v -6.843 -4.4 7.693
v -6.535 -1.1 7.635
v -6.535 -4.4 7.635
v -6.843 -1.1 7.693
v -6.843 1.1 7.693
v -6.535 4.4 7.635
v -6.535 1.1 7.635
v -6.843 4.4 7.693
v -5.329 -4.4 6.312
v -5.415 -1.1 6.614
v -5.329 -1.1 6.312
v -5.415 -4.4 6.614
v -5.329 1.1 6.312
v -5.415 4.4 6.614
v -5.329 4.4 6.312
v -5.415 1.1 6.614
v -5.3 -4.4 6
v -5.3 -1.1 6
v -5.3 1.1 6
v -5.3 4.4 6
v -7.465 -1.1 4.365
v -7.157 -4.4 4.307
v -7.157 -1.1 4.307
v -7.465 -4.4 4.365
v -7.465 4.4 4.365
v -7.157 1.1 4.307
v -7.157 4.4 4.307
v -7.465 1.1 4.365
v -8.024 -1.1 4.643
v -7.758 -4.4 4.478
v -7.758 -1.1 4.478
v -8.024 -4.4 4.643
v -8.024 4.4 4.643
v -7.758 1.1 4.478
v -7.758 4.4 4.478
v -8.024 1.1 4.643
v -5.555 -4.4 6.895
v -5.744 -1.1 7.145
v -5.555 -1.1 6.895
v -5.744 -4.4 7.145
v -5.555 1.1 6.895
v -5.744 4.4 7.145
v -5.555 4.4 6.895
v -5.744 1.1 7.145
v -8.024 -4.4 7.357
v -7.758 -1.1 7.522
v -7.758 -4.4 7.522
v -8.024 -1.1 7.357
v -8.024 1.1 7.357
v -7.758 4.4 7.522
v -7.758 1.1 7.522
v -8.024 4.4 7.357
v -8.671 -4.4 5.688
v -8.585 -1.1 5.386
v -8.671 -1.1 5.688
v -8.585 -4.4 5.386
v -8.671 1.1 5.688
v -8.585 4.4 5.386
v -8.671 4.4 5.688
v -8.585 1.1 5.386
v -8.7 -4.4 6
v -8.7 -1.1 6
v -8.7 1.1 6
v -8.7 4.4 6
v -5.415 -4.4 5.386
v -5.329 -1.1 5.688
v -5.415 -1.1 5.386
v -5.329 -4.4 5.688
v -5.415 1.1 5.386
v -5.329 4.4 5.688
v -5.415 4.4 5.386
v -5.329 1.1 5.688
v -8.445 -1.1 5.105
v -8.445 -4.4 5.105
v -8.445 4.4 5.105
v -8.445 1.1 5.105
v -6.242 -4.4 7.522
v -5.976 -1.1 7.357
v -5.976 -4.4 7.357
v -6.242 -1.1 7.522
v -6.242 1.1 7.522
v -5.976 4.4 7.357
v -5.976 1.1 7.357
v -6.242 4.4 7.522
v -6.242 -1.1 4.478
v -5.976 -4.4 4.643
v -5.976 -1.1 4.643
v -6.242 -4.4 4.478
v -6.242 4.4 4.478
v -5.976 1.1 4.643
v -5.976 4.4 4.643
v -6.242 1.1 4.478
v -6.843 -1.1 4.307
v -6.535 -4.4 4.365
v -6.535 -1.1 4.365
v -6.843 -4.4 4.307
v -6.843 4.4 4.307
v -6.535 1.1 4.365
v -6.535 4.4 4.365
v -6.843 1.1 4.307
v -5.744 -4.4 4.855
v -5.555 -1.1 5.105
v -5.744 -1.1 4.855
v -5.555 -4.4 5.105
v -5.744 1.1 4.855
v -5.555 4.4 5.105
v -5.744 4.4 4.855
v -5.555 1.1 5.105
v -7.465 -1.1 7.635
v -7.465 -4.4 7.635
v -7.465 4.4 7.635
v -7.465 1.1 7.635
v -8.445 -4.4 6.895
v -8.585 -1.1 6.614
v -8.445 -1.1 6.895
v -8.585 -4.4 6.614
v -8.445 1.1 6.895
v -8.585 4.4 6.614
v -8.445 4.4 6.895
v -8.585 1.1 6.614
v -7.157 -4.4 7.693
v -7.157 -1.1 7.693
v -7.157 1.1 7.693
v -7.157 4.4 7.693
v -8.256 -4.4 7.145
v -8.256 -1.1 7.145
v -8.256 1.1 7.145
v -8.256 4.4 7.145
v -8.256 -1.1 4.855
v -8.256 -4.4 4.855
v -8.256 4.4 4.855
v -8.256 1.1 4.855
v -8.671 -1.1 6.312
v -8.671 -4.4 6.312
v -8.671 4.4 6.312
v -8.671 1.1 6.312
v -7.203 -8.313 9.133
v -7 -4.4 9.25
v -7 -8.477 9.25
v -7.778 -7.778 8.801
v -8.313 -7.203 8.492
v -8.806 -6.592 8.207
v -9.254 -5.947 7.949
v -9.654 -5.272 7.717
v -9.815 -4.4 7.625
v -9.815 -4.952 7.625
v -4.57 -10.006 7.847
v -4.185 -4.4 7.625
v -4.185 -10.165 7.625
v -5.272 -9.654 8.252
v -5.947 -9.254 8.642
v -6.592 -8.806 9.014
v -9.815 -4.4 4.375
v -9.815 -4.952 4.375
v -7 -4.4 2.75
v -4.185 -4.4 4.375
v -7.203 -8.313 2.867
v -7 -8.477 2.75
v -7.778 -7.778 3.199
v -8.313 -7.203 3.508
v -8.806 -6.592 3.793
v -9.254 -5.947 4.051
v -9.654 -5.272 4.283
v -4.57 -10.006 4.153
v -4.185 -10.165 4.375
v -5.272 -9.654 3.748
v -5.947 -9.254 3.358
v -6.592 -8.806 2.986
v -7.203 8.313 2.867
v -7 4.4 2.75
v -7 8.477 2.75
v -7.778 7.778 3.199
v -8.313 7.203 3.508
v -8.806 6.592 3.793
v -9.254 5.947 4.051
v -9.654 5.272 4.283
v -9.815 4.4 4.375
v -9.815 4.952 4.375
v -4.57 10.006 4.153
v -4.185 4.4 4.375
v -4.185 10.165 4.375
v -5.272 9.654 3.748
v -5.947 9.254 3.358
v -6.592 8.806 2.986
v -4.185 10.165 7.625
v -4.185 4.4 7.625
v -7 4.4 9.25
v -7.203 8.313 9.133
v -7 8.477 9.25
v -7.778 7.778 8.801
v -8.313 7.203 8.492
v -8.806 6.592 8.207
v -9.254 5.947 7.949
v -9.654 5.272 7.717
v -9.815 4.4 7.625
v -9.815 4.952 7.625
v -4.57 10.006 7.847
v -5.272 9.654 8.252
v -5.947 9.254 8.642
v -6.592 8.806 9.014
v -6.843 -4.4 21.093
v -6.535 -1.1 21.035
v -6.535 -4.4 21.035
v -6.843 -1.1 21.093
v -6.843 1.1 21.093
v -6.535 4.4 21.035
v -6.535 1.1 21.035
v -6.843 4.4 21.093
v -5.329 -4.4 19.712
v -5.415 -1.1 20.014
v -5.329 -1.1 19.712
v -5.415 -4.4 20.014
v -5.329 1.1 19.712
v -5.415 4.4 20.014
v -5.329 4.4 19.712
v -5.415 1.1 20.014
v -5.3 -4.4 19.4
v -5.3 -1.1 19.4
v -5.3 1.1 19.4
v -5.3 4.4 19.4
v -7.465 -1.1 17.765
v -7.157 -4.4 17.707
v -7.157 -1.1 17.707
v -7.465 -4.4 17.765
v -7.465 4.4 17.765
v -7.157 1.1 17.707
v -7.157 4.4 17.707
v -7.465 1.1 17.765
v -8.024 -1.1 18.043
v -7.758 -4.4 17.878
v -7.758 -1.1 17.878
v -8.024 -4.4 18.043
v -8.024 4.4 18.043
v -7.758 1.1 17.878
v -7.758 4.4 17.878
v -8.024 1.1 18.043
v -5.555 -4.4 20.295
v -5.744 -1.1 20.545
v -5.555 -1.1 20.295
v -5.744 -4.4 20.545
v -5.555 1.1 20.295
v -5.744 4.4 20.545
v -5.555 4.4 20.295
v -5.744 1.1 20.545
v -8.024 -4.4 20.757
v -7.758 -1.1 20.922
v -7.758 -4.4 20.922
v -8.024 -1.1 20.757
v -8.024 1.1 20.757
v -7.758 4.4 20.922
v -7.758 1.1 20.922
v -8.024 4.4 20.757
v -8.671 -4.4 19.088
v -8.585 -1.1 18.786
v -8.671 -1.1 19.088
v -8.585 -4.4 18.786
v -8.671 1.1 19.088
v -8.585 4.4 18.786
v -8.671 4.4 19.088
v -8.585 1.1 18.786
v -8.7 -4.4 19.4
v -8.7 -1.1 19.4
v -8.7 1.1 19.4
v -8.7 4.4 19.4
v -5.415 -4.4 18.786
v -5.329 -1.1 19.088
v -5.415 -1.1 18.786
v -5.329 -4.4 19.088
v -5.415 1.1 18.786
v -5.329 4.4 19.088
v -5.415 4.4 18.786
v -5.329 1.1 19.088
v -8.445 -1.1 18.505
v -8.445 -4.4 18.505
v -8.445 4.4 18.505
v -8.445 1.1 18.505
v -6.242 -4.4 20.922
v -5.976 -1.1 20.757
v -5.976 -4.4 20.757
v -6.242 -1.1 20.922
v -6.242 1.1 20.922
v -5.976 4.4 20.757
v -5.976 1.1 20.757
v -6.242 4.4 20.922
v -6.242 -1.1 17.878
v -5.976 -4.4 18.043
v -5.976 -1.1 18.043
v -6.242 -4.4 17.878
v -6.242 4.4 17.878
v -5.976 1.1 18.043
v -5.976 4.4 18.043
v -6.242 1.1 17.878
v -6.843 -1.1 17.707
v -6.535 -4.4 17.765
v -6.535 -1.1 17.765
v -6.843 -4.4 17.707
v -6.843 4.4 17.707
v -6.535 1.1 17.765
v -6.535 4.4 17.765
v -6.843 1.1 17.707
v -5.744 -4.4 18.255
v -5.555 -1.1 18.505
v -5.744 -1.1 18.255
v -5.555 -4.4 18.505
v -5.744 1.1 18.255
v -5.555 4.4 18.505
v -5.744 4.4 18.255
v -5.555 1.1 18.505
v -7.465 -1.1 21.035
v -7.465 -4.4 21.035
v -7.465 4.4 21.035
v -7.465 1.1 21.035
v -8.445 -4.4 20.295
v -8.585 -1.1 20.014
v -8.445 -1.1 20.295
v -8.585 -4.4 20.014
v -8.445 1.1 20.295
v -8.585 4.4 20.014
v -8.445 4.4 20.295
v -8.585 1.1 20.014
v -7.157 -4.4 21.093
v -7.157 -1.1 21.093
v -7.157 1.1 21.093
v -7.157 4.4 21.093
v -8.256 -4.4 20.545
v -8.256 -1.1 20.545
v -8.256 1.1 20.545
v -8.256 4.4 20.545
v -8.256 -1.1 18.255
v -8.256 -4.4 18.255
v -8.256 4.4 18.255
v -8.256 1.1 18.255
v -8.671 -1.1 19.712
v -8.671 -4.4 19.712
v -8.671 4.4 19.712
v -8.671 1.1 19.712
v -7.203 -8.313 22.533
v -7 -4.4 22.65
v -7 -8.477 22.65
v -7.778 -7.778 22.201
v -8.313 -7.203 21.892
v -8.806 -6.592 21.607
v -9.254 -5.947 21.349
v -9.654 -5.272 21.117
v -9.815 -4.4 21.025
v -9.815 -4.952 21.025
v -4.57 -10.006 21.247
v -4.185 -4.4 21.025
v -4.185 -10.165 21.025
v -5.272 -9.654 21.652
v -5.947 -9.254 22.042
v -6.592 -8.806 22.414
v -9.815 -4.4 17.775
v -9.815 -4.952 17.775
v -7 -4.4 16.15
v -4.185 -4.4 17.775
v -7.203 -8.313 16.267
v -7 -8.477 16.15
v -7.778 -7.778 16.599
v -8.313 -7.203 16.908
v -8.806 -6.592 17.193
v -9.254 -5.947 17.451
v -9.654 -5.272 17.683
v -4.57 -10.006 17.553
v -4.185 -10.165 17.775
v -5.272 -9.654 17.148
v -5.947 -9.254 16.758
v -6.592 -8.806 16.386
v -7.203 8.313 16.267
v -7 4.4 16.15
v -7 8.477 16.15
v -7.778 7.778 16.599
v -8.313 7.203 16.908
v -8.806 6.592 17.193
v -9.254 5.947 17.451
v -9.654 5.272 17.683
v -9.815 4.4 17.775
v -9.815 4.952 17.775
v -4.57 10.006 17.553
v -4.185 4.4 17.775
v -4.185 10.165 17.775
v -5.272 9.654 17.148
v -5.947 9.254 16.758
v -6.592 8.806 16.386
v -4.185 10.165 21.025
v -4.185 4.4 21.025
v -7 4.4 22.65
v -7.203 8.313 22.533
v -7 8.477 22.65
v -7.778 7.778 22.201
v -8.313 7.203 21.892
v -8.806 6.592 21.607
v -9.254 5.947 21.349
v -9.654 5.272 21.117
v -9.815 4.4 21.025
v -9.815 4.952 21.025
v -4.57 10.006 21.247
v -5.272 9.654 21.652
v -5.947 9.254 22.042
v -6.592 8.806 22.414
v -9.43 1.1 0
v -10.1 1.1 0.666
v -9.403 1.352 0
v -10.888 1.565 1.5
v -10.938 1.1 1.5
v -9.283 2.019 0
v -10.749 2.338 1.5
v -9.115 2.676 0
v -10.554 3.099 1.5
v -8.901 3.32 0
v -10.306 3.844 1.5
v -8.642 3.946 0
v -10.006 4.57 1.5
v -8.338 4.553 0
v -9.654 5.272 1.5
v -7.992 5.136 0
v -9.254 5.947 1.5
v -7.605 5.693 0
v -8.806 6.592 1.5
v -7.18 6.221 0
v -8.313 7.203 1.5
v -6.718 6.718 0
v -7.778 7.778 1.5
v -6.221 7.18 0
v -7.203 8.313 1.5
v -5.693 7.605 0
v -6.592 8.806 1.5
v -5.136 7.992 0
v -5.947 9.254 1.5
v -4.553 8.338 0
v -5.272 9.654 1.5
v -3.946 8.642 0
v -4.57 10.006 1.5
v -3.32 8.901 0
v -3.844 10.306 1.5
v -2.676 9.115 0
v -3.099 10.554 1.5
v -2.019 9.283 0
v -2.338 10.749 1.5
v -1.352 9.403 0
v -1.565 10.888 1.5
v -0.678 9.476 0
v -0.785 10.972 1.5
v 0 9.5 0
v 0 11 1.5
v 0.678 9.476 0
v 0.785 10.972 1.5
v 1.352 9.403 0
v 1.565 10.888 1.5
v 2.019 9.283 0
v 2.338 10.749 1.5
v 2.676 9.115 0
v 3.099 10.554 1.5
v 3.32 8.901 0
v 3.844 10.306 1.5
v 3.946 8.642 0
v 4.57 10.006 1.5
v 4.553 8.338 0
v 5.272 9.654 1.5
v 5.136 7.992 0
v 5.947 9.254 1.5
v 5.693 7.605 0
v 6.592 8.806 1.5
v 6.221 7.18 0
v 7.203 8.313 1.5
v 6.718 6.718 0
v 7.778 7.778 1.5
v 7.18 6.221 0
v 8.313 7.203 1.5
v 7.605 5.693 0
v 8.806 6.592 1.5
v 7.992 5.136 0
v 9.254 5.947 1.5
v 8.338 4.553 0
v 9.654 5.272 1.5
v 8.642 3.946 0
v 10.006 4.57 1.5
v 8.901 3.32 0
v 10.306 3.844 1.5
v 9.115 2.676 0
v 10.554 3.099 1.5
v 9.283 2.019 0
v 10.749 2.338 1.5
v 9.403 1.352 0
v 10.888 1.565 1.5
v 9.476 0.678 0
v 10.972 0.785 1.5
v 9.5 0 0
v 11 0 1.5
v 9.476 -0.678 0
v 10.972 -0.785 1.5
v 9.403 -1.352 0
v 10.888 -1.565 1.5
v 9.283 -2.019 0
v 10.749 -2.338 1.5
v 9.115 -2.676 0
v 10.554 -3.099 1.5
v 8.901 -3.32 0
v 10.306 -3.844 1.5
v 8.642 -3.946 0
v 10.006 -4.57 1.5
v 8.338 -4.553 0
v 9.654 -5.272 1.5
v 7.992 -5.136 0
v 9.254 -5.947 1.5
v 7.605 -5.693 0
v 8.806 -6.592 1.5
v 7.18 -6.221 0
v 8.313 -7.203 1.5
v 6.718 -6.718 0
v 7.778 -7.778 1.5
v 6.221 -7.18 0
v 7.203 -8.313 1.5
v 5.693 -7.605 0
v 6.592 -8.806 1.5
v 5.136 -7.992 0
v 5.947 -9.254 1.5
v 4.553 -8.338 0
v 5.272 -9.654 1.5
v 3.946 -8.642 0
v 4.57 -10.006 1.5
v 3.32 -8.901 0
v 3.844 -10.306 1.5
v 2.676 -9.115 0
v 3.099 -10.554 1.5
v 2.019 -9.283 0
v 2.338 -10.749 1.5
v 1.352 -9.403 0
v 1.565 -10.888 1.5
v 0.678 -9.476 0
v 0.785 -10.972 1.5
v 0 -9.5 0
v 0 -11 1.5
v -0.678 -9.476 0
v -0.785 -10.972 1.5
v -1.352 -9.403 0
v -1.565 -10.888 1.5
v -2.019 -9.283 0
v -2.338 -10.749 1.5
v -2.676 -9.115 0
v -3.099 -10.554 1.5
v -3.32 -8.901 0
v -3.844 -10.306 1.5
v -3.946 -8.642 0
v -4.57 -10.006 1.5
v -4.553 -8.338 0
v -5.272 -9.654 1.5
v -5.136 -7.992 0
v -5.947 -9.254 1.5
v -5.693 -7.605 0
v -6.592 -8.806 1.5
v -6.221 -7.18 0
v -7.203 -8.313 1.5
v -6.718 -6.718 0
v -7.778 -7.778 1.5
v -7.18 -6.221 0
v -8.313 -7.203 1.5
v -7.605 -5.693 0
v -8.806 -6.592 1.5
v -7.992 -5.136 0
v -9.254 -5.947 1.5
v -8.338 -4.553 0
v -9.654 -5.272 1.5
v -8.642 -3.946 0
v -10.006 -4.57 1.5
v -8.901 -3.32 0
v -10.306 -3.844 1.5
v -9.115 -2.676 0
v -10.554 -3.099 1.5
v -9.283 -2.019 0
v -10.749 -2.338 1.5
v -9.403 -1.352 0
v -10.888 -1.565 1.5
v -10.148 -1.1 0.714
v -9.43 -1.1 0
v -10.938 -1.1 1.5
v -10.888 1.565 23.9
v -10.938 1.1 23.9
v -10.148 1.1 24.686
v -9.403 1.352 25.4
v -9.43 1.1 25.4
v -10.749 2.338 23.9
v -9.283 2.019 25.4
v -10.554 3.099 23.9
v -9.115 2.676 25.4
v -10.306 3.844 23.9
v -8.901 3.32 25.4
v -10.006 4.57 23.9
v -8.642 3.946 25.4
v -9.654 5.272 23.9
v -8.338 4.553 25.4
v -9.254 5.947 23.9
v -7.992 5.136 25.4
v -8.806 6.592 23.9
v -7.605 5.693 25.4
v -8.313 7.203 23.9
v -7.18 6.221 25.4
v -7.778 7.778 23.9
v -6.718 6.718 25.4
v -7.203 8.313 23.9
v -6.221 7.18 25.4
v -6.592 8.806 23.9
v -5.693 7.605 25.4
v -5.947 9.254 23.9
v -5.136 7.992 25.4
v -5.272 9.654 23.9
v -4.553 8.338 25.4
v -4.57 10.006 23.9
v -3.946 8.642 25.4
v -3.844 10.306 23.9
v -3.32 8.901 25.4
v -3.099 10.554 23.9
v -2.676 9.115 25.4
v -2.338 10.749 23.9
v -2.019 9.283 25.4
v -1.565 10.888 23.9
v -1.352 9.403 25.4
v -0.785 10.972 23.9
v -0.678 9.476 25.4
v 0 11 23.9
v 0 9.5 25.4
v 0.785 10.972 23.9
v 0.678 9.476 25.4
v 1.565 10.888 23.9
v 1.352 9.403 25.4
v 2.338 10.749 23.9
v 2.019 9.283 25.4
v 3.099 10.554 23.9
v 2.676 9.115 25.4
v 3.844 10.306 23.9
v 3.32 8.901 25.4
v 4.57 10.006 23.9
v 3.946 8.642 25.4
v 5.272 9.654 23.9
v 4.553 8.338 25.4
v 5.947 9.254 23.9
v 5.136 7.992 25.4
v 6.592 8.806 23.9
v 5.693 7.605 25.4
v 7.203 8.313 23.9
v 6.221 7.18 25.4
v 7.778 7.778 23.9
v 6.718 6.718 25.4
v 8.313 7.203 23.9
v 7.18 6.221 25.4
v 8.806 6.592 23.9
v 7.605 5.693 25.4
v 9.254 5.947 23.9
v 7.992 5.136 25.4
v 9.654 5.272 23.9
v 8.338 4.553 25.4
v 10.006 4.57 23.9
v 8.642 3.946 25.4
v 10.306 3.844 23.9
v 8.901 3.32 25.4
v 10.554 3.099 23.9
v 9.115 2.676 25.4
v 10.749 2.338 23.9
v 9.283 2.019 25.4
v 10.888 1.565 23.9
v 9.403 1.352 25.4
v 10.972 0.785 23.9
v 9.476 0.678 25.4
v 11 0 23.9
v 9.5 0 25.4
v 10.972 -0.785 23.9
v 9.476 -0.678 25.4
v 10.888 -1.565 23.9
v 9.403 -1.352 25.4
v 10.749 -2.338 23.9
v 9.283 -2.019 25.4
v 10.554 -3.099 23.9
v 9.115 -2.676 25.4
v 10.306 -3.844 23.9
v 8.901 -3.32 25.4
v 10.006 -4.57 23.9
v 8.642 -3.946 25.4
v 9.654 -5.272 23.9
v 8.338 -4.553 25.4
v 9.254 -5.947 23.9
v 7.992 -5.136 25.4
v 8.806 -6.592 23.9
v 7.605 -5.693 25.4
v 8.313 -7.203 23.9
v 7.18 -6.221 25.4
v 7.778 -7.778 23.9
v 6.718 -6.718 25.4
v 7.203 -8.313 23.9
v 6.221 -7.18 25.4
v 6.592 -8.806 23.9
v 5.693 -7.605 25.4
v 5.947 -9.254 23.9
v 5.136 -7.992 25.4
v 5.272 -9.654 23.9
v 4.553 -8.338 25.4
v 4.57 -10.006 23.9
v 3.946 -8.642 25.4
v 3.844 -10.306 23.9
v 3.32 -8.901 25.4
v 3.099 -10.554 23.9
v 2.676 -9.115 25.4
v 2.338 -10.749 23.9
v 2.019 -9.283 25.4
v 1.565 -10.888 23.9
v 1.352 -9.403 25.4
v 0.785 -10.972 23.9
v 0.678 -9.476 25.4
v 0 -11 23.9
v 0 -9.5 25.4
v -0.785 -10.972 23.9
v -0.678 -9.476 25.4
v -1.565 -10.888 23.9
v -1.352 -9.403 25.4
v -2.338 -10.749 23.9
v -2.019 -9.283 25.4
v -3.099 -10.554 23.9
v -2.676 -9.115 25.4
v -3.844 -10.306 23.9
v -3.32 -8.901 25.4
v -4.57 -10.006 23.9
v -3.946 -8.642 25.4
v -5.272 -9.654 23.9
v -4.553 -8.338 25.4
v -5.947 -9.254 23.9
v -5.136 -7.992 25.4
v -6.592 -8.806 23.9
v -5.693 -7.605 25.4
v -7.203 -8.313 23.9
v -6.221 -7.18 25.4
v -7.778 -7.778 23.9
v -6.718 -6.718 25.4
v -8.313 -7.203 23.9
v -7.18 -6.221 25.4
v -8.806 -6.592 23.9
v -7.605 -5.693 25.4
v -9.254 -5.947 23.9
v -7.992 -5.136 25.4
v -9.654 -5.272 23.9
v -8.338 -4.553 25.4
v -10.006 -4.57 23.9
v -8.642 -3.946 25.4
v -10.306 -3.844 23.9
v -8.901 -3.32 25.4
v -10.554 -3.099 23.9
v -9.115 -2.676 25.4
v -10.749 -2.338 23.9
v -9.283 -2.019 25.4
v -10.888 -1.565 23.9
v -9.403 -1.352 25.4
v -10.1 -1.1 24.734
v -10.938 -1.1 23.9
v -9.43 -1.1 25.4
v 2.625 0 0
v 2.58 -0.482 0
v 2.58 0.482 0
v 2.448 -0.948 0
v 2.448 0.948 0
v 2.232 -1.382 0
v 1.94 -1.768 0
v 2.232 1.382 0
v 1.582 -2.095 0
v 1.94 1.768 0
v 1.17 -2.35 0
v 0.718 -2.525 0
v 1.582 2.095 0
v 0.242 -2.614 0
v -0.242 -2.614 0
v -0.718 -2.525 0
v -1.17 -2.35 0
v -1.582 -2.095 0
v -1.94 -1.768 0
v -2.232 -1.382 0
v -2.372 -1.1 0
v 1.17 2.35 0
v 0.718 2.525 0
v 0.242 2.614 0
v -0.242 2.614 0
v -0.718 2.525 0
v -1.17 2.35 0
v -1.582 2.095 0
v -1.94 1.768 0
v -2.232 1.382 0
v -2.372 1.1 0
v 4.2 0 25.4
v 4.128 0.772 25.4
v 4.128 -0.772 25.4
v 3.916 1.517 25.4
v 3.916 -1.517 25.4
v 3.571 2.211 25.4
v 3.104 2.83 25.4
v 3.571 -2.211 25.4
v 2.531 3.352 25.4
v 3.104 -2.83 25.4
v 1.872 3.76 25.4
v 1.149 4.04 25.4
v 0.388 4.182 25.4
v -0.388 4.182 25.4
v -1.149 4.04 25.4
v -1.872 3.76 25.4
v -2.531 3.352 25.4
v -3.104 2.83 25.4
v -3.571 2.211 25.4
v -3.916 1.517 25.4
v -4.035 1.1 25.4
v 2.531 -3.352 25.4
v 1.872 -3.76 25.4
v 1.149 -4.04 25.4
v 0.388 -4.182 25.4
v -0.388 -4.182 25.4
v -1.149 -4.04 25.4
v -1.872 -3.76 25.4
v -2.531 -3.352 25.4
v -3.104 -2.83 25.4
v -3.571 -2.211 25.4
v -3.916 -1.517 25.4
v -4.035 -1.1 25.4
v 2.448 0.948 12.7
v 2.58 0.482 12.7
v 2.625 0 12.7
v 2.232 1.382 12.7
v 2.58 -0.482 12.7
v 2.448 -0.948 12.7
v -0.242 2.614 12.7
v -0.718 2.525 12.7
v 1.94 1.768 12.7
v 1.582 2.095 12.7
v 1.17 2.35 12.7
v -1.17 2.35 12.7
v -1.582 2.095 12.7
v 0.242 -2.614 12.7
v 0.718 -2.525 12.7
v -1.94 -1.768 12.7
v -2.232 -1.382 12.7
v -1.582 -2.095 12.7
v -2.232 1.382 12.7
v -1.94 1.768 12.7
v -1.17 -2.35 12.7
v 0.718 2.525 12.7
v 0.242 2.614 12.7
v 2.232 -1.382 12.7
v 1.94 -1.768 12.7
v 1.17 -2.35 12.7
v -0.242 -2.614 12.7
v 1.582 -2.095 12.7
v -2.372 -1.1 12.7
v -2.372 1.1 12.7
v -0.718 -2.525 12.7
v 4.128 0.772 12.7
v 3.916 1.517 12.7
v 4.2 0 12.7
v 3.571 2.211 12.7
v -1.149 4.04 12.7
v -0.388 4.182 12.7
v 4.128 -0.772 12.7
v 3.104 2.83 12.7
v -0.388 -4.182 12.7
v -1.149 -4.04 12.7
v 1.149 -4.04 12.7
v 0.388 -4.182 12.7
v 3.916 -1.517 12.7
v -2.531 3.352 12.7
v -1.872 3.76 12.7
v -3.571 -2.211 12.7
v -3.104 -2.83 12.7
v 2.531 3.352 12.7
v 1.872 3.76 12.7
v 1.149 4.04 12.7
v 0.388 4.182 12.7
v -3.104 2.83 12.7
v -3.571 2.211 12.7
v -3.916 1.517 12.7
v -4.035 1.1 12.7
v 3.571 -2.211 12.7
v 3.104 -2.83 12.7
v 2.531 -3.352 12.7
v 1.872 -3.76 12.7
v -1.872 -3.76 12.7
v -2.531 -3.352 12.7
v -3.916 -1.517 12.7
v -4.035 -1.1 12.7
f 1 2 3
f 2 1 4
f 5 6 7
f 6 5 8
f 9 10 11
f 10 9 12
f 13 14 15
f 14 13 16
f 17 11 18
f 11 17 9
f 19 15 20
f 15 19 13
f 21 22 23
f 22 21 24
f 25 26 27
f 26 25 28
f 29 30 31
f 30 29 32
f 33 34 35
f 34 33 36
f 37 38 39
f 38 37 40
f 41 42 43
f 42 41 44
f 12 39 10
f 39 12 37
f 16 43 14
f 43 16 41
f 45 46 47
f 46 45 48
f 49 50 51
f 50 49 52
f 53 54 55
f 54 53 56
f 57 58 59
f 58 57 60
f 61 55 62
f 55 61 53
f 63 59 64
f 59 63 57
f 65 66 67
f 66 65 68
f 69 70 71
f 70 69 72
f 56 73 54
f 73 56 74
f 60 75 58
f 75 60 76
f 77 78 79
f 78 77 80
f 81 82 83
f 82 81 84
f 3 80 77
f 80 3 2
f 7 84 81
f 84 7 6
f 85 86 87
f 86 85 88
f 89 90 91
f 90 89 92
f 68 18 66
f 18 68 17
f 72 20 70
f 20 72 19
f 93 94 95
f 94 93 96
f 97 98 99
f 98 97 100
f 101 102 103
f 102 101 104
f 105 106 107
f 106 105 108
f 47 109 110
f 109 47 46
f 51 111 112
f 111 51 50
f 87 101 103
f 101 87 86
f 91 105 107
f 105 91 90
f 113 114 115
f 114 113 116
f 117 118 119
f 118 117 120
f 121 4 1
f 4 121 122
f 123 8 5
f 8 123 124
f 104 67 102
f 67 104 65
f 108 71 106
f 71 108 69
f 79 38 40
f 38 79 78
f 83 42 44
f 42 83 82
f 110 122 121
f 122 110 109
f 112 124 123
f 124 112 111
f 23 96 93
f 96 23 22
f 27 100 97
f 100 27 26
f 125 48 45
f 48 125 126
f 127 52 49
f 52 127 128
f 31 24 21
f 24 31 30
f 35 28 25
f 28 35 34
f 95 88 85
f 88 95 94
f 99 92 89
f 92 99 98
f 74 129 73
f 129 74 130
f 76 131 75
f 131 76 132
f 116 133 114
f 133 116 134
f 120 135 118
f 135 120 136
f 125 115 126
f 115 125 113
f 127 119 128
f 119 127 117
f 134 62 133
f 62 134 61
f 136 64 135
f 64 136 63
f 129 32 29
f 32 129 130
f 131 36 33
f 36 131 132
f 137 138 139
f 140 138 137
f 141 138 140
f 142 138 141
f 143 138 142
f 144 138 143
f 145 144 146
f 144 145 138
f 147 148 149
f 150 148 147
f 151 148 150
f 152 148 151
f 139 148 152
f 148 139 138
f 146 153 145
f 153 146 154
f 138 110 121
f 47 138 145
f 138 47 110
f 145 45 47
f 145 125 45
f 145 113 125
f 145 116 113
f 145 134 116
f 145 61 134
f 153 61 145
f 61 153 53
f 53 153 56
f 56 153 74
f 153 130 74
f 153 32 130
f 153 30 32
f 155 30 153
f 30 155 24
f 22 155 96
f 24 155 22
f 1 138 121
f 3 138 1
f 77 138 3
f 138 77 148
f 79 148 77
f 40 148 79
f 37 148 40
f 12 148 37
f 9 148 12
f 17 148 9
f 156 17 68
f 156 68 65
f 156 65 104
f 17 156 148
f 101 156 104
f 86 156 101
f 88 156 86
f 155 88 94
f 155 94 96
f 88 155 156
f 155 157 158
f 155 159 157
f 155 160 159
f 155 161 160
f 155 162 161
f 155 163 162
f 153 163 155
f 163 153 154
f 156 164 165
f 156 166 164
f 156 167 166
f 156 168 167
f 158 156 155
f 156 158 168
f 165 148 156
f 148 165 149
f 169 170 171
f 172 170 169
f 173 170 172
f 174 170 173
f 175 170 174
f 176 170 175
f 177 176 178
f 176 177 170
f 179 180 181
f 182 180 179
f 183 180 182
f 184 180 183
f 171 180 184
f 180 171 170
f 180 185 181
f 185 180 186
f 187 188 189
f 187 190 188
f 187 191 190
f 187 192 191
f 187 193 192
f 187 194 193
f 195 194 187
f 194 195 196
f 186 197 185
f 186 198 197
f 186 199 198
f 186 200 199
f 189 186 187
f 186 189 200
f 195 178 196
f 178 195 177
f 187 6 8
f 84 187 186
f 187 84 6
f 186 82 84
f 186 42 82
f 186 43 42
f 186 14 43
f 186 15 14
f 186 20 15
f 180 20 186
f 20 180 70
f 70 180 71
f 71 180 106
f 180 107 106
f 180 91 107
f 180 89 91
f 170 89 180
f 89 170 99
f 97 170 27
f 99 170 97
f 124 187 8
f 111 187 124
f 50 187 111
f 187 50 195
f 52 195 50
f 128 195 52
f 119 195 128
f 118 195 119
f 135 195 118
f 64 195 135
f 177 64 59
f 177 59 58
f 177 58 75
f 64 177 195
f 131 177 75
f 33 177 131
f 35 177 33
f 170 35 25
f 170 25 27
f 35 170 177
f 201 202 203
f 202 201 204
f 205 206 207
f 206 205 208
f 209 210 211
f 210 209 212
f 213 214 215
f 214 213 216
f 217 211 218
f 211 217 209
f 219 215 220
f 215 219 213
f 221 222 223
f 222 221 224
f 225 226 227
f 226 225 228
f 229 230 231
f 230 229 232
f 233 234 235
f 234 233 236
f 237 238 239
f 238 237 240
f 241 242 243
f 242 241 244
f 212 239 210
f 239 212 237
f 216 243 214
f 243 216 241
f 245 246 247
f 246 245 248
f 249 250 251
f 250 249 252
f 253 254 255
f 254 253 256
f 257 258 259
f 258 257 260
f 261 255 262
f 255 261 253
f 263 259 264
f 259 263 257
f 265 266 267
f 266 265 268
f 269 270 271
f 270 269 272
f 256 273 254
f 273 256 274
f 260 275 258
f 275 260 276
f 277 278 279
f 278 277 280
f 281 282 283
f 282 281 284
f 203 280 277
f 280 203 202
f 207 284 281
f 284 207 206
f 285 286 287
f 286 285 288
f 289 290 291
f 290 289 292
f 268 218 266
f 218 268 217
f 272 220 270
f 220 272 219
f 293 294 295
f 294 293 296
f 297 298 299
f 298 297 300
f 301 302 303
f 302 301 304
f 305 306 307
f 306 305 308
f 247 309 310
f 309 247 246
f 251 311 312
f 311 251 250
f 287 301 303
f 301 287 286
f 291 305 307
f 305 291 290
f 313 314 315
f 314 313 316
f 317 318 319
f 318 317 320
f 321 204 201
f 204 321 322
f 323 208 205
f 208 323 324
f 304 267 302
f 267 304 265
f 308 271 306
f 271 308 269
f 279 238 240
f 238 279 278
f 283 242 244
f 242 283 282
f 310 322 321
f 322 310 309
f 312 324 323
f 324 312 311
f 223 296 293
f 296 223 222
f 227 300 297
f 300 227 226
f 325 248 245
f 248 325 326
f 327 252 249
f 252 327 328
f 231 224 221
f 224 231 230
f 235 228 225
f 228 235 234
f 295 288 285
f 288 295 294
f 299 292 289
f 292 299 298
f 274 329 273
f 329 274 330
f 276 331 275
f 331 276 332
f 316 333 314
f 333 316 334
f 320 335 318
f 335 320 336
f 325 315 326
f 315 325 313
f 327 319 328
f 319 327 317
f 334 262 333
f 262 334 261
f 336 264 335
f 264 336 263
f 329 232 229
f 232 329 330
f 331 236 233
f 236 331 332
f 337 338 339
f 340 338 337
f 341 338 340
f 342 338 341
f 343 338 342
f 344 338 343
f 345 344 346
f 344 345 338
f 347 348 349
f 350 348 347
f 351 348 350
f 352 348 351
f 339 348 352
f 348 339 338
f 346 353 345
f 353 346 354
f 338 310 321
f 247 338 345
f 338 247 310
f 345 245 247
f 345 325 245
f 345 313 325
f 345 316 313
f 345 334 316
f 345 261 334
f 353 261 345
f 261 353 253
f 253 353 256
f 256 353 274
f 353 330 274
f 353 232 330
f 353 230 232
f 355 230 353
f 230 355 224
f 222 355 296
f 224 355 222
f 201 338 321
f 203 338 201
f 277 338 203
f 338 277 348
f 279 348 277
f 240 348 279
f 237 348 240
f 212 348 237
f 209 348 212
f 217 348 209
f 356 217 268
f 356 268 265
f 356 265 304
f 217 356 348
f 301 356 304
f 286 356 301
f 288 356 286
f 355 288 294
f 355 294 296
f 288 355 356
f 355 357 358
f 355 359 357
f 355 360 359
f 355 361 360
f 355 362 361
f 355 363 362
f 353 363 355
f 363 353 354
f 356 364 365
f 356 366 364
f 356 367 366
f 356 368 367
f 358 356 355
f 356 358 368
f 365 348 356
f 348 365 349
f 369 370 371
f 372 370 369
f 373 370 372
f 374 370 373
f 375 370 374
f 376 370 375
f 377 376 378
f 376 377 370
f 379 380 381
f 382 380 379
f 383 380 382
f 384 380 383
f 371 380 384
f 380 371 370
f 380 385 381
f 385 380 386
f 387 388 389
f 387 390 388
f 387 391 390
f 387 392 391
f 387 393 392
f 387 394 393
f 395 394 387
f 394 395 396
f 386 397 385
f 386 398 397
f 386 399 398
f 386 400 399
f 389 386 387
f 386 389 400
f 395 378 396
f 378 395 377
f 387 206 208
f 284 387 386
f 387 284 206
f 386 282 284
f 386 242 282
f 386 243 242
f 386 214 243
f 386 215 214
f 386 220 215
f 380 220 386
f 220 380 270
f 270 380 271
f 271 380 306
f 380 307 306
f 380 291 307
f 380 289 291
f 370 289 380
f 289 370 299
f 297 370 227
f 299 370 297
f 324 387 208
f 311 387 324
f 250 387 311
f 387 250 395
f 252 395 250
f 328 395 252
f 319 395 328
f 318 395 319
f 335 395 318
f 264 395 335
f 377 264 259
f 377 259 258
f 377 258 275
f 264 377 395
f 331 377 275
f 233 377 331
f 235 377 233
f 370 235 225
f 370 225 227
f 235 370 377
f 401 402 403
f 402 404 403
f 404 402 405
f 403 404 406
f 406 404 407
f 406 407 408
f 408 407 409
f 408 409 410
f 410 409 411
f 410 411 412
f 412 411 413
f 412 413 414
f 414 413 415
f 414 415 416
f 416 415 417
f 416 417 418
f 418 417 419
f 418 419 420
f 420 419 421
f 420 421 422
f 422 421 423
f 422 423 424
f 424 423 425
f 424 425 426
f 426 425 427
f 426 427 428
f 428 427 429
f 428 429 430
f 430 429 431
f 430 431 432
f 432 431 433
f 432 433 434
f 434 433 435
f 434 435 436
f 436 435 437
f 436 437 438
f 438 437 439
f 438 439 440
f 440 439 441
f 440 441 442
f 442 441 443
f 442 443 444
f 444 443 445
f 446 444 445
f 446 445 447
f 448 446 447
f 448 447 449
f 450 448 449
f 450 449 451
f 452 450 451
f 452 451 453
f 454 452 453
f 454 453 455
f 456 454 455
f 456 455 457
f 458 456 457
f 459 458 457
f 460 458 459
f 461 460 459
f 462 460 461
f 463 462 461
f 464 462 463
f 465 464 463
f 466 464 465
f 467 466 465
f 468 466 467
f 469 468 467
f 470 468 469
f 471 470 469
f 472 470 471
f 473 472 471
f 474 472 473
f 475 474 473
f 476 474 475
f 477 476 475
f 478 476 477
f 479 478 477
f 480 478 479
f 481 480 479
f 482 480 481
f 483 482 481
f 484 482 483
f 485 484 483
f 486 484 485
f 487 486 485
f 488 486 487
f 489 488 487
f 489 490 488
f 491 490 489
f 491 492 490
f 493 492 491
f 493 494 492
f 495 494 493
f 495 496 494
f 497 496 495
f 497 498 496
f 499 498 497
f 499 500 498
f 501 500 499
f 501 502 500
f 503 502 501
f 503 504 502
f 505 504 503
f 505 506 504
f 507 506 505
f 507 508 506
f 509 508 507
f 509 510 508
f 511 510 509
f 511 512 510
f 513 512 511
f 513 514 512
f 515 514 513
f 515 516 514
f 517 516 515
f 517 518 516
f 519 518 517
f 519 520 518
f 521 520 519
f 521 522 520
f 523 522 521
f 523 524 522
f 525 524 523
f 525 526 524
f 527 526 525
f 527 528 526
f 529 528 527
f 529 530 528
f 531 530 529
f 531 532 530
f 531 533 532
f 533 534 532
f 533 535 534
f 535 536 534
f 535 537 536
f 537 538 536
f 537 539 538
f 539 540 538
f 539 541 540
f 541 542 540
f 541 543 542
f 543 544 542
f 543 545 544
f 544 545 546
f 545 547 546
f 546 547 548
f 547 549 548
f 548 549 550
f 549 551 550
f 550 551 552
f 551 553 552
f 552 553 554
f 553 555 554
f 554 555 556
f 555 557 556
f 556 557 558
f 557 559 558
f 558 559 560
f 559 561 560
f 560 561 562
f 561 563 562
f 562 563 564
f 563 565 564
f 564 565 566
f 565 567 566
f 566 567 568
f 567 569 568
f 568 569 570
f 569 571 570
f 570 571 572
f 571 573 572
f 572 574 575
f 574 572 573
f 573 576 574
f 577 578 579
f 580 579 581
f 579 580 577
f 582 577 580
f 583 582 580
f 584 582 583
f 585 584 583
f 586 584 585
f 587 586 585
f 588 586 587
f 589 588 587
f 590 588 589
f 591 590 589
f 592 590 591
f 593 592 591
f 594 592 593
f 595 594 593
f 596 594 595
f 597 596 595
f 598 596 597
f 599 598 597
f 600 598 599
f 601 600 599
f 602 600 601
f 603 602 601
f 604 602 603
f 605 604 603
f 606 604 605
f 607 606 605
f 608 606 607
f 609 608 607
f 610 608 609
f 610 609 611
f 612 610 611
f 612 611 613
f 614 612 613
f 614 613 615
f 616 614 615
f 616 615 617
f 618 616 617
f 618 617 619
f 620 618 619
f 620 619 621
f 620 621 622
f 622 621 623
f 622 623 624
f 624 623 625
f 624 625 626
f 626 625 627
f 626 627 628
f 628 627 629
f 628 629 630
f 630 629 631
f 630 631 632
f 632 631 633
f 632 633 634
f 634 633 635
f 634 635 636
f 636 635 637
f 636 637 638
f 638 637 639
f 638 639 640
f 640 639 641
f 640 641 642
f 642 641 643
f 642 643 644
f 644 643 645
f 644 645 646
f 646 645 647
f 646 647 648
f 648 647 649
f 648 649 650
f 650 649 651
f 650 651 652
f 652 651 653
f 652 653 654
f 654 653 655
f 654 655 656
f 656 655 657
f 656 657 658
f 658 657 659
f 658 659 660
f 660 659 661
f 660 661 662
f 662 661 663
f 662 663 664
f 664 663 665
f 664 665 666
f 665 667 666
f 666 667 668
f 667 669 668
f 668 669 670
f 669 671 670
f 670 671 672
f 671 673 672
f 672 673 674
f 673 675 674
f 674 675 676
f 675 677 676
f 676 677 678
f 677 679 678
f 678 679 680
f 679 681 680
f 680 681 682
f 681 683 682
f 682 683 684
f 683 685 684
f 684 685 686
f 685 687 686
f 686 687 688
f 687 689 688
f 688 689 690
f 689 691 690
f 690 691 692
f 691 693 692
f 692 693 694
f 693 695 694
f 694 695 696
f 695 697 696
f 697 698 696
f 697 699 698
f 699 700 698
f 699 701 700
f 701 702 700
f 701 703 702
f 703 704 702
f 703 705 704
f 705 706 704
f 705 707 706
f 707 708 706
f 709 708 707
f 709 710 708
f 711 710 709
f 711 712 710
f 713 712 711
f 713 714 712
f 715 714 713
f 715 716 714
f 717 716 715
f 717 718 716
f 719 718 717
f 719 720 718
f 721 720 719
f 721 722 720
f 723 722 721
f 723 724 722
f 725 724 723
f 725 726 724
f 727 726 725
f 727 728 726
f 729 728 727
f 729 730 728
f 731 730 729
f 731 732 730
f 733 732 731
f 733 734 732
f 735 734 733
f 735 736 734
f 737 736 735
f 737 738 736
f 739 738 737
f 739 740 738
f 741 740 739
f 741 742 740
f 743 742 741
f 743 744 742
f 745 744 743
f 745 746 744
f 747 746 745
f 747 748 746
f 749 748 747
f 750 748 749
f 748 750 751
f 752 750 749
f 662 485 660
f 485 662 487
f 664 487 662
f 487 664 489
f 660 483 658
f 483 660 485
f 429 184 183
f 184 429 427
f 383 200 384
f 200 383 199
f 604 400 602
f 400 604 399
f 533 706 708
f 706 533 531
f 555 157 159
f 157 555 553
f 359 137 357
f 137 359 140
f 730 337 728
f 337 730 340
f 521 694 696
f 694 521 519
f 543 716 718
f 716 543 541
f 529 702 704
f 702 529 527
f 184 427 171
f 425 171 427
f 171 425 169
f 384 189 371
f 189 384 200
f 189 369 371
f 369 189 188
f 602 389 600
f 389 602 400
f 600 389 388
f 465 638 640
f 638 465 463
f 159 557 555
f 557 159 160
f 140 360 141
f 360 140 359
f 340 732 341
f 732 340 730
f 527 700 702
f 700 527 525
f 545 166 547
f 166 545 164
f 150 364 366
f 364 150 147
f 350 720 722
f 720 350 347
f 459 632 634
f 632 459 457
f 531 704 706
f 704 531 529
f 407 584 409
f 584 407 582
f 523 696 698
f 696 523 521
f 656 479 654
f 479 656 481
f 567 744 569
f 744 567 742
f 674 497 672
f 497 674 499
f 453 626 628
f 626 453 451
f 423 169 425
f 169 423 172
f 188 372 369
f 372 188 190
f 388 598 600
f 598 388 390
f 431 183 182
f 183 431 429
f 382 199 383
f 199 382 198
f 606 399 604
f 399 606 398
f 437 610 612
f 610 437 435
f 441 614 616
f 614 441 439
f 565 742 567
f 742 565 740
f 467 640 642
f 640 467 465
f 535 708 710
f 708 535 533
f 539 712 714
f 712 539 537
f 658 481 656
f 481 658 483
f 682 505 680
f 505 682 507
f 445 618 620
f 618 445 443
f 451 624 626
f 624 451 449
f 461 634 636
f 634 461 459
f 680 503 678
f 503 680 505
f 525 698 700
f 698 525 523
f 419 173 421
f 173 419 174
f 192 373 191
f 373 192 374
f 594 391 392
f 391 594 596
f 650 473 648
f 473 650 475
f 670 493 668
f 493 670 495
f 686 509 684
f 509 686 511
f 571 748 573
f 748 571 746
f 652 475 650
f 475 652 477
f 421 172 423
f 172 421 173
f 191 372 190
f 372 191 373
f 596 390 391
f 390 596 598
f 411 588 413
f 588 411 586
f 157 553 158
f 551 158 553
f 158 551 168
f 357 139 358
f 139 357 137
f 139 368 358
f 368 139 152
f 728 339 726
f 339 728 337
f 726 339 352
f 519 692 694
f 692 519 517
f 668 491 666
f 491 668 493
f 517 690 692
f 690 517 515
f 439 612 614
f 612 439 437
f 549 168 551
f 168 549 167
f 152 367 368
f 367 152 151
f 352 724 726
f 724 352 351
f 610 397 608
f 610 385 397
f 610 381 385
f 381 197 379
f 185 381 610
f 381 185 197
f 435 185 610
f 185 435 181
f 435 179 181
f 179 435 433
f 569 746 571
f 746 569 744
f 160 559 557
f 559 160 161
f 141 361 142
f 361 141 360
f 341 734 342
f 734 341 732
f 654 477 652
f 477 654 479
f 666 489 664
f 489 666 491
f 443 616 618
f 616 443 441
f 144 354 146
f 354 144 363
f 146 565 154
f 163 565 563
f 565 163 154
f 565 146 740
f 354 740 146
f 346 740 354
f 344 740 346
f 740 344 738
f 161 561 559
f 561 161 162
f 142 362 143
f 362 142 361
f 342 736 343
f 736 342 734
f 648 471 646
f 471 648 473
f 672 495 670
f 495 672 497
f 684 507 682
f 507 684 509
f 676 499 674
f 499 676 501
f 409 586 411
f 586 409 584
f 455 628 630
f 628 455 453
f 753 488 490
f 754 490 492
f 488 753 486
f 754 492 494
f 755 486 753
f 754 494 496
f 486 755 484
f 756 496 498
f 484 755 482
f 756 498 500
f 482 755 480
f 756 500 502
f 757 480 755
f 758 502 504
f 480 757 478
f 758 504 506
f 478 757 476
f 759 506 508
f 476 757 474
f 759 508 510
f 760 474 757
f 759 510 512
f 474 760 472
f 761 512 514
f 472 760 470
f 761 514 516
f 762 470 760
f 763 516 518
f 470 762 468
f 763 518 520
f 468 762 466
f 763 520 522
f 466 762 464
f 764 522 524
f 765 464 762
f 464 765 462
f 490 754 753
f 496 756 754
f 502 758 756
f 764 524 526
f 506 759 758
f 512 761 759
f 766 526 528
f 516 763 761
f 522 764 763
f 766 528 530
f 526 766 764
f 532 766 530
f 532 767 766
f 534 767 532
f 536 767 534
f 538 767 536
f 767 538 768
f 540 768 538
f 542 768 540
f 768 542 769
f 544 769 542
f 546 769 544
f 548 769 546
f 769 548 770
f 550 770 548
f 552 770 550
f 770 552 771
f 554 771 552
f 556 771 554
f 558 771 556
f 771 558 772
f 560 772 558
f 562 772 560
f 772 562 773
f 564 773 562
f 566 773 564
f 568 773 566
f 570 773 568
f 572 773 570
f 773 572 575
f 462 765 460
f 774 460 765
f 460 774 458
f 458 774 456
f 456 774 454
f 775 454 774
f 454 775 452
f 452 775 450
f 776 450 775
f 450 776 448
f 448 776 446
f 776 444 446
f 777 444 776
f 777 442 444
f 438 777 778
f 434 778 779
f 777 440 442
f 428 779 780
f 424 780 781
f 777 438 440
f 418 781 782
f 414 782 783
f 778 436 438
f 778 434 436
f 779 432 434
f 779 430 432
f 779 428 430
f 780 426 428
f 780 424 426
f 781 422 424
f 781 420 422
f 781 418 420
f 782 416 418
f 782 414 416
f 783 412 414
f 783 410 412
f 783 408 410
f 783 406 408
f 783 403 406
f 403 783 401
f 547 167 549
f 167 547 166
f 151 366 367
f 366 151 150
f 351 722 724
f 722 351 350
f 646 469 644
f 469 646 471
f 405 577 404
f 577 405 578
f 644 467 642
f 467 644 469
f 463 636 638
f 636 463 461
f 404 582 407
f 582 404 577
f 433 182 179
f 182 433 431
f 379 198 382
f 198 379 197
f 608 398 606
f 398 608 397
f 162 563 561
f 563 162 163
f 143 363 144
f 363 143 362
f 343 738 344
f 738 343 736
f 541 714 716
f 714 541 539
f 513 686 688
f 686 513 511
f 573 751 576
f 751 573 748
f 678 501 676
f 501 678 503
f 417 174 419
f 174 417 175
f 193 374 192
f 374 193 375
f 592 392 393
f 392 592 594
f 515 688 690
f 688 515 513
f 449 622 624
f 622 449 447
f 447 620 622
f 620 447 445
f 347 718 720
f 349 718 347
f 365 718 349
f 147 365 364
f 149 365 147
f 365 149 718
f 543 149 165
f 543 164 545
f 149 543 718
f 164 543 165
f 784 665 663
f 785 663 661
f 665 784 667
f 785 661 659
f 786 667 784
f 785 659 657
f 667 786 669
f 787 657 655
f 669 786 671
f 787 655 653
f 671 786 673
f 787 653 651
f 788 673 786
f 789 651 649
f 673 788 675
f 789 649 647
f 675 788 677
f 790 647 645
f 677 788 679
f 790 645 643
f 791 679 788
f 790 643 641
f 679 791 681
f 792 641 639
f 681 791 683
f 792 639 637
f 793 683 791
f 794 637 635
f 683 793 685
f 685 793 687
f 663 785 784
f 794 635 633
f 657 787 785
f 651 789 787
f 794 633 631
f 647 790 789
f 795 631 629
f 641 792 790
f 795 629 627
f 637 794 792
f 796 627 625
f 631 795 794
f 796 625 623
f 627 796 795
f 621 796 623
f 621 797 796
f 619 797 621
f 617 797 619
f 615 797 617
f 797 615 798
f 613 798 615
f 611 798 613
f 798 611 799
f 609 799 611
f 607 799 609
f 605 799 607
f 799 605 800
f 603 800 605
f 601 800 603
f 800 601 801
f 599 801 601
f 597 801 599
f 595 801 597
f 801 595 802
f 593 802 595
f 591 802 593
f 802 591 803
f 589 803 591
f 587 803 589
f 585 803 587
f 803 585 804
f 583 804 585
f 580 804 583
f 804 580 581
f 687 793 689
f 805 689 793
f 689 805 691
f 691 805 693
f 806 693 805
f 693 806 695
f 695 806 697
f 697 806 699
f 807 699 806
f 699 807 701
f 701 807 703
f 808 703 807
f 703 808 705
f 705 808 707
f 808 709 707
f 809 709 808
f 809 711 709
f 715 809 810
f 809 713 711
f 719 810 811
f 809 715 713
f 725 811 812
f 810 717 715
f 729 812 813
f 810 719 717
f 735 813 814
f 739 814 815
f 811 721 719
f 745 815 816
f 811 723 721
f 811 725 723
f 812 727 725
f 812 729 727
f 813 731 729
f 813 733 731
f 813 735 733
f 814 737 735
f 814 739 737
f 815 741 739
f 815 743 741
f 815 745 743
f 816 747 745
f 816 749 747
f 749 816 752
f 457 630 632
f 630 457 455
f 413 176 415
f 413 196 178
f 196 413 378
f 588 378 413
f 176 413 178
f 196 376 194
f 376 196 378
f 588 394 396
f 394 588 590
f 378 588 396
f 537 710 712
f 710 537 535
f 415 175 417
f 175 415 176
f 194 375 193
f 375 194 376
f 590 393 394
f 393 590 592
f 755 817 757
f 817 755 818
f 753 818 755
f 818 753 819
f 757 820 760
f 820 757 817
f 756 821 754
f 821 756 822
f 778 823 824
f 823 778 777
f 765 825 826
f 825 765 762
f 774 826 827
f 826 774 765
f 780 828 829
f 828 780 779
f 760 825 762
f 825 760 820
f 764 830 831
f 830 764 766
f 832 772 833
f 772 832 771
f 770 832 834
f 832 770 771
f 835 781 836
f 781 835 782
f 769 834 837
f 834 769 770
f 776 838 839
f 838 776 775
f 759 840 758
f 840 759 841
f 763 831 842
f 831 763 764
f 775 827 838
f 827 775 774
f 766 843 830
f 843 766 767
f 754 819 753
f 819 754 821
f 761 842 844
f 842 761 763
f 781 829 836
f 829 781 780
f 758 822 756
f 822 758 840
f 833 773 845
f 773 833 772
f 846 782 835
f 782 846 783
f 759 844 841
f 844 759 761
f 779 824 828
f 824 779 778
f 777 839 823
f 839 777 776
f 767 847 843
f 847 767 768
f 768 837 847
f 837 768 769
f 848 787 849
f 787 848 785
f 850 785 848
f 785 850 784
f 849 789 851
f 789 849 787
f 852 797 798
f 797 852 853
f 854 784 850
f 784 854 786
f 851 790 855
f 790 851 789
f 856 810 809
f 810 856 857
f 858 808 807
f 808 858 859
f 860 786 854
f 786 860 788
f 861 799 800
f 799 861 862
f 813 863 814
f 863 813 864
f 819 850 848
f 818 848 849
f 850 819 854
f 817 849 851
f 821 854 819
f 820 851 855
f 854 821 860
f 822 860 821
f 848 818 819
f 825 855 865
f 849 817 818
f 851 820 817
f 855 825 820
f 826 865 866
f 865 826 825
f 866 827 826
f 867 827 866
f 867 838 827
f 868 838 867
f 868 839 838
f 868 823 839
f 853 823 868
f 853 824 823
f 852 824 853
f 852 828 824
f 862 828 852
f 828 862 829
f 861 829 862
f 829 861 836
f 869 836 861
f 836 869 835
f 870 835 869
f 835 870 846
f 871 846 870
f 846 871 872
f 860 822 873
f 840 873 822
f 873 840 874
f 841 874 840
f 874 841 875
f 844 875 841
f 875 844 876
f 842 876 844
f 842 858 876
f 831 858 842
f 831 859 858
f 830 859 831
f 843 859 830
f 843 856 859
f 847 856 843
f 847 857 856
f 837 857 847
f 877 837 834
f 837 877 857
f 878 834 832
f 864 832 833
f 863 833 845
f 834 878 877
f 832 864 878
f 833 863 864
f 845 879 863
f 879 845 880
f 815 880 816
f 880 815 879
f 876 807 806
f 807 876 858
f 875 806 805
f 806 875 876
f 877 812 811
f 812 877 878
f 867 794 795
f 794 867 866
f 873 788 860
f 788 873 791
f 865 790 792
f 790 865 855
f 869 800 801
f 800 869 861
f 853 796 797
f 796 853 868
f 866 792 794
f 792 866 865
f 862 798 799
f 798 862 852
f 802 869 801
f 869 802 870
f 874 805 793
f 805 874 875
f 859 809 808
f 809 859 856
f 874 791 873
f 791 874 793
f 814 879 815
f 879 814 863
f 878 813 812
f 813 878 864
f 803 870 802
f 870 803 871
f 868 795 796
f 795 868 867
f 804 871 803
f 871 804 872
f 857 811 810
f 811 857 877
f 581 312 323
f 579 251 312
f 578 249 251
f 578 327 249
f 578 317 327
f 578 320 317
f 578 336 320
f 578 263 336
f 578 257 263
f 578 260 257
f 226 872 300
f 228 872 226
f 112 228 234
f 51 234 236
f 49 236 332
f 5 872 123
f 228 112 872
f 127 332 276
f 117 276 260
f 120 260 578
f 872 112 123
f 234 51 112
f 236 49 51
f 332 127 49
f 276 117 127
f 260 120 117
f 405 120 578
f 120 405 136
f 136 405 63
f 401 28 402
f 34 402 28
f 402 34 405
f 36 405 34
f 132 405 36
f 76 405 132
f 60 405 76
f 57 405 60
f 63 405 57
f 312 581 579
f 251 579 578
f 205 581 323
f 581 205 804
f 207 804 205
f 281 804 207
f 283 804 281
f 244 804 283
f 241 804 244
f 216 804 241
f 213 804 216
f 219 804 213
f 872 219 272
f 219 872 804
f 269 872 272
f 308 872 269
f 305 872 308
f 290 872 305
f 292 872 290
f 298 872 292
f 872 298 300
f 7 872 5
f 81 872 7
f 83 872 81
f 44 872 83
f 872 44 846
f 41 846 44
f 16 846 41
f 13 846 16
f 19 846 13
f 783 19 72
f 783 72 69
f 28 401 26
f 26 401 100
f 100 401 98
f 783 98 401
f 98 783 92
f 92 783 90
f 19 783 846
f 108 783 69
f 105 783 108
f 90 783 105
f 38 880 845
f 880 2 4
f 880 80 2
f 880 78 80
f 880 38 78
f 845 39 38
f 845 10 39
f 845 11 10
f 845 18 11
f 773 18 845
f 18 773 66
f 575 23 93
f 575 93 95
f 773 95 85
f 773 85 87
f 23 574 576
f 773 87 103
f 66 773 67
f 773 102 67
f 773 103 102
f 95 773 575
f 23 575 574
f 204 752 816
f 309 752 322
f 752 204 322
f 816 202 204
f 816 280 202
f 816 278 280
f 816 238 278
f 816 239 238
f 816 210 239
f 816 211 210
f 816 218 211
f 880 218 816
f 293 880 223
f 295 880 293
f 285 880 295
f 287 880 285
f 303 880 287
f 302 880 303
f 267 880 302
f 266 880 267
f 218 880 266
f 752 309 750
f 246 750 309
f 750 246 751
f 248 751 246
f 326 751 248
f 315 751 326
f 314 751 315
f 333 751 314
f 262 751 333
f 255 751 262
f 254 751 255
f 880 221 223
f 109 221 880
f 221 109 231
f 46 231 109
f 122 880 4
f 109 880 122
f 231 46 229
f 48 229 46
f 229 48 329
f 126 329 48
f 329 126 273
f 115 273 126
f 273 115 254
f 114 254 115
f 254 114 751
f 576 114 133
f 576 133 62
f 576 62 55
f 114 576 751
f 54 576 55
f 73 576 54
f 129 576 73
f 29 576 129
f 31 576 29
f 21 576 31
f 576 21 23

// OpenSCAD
//Parametric Coupler
//By David Bunch 8/9/2015
//
//This design is based on the Rigid Coupler for the
//Mostly printed CNC machine http://www.thingiverse.com/thing:724999
//To couple different or same size Shafts together,
//usually a nema 17 motor to a threaded rod
//The little bolts used to tighten this design are M3 x 14mm or 16mm length
//CUSTOMIZER VARIABLES

//1. Outside Diameter of Coupler (try 20 for 5mm to 5mm)
OD = 22;

//2. Total Height of Coupler
Ht = 25.4;

//3. Small Coupler Connection (5mm default)
ShaftSmall = 5.25;              //Add 5% to make more of a slip fit
                                //Tightening bolts will snug this up
                               //6.66 = 1/4"(6.35mm)

//4. Large Coupler Connection (8mm default)
ShaftLarge = 8.4;              //Add 5% to make more of a slip fit
                               //8.4 = 8mm, 6.3 = 6mm, 5.25 = 5mm


//5. Gap Cut size for Tightening Coupler
GapDist = 2.2;

//6. Coupling Bolt Diameter used for Tightening (M3 default)
M3 = 3.4;              //Use 3.65 for #6 bolts

//7. Coupling Bolt Diameter used for Tightening
M3Nut = 6.5;           //if using #6 Nuts use 9.25mm
                        //4mm nuts 8.08mm (
                        //3mm nuts 6.5mm (This size worked good for me)

//8. Bolt Length (14mm long bolt is default)
BoltLen = 14;         //This should still be a good length for
                        //14mm or 16mm length bolts will just
                        //        stick out a little beyond locknut

//9. X Offset for Bolt Tightening Holes (try 6 for 5mm to 5mm)
M3_DX=7;

//10. 1st Z Offset for Bolt Tightening Holes
M3_DZ1 = 6;

//11. 2nd Z Offset for Bolt Tightening Holes
M3_DZ2 = 19.4;

//12. Resolution large Circles
IresBig = 88;

//13. Resolution of Small Circles
IresSmall = 34;

//14. Chamfer Radius at Top & bottom
ChamferSize = 1.5;        //Set width of chamfer at top & bottom

//15. 1 part or 2 Halves
PartType = 1;   //2 Halves are useful if your 2 shafts are already in place

//CUSTOMIZER VARIABLES END

M3_Thk = (BoltLen - GapDist - 5.2) / 2;
echo("M3_Thk = ", M3_Thk);

GapHalf = GapDist / 2;
M3Nut_DY = M3_Thk + GapHalf;

Rad = OD / 2;

//This is the Chamfer used at the bottom & top of coupling
module ChamferCyl()
{
    if (ChamferSize > 0)
    {
        rotate_extrude(convexity = 10, $fn = IresBig)
        translate([Rad, 0, 0])
        circle(r = ChamferSize, $fn = 4);
    }
}
//These are the holes for the tightening bolts & nuts
module BoltAndNutCut()
{
//Drill hole all the way through
    translate([-M3_DX,Rad,0])
    rotate([90,0,0])
    cylinder(d=M3,h=OD,$fn=IresSmall);
//Cut for hex nut on one end
    translate([-M3_DX,-M3Nut_DY,0])
    rotate([90,0,0])
    rotate([0,0,30])
    cylinder(d=M3Nut,h=Rad,$fn=6); 
//Cut for hex nut on the other end
    translate([-M3_DX,M3Nut_DY,0])
    rotate([-90,0,0])
    rotate([0,0,30])
    cylinder(d=M3Nut,h=Rad,$fn=6);
}
module HorizontalHoles()
{
    translate([0,0,M3_DZ1])
    BoltAndNutCut();            //Lower Horizontal Hole
    translate([0,0,M3_DZ2])
    BoltAndNutCut();            //Upper Horizontal Hole
}
//Cut out the holes, gap & draw final part
module DrawFinal()
{
    difference()
    {
        cylinder(d=OD,h=Ht,$fn=IresBig);        //Draw the main cylinder
        translate([0,0,-1])
        cylinder(d=ShaftSmall,h=Ht+2,$fn=IresSmall);    //Cut small shaft hole from bottom
        translate([0,0,Ht / 2])                         //Start 2nd hole half way up
        cylinder(d=ShaftLarge,h=Ht,$fn=IresSmall);      //Cut large or same size shaft hole
        translate([-(Rad+.01),-GapHalf,-1])
        cube([Rad,GapDist,Ht+2]);       //Cut gap for tightening
//Cut bottom bolt tightening hole
        HorizontalHoles();  //Cut horizontal holes for tightening bolts
//See if user wants to draw this as 2 halves instead of just 1 gap cut
        if (PartType == 2)
        {
            rotate([0,0,180])
            {
                HorizontalHoles();  //Cut horizontal holes for tightening bolts
                translate([-(Rad+.01),-GapHalf,-1])
                cube([Rad,GapDist,Ht+2]);       //Cut gap for tightening
            }
        }
        if (ChamferSize > 0)
        {
            ChamferCyl();                   //Chamfer the top
            translate([0,0,Ht])
            ChamferCyl();                   //Chamfer the bottom
        }
    }
}


DrawFinal();
